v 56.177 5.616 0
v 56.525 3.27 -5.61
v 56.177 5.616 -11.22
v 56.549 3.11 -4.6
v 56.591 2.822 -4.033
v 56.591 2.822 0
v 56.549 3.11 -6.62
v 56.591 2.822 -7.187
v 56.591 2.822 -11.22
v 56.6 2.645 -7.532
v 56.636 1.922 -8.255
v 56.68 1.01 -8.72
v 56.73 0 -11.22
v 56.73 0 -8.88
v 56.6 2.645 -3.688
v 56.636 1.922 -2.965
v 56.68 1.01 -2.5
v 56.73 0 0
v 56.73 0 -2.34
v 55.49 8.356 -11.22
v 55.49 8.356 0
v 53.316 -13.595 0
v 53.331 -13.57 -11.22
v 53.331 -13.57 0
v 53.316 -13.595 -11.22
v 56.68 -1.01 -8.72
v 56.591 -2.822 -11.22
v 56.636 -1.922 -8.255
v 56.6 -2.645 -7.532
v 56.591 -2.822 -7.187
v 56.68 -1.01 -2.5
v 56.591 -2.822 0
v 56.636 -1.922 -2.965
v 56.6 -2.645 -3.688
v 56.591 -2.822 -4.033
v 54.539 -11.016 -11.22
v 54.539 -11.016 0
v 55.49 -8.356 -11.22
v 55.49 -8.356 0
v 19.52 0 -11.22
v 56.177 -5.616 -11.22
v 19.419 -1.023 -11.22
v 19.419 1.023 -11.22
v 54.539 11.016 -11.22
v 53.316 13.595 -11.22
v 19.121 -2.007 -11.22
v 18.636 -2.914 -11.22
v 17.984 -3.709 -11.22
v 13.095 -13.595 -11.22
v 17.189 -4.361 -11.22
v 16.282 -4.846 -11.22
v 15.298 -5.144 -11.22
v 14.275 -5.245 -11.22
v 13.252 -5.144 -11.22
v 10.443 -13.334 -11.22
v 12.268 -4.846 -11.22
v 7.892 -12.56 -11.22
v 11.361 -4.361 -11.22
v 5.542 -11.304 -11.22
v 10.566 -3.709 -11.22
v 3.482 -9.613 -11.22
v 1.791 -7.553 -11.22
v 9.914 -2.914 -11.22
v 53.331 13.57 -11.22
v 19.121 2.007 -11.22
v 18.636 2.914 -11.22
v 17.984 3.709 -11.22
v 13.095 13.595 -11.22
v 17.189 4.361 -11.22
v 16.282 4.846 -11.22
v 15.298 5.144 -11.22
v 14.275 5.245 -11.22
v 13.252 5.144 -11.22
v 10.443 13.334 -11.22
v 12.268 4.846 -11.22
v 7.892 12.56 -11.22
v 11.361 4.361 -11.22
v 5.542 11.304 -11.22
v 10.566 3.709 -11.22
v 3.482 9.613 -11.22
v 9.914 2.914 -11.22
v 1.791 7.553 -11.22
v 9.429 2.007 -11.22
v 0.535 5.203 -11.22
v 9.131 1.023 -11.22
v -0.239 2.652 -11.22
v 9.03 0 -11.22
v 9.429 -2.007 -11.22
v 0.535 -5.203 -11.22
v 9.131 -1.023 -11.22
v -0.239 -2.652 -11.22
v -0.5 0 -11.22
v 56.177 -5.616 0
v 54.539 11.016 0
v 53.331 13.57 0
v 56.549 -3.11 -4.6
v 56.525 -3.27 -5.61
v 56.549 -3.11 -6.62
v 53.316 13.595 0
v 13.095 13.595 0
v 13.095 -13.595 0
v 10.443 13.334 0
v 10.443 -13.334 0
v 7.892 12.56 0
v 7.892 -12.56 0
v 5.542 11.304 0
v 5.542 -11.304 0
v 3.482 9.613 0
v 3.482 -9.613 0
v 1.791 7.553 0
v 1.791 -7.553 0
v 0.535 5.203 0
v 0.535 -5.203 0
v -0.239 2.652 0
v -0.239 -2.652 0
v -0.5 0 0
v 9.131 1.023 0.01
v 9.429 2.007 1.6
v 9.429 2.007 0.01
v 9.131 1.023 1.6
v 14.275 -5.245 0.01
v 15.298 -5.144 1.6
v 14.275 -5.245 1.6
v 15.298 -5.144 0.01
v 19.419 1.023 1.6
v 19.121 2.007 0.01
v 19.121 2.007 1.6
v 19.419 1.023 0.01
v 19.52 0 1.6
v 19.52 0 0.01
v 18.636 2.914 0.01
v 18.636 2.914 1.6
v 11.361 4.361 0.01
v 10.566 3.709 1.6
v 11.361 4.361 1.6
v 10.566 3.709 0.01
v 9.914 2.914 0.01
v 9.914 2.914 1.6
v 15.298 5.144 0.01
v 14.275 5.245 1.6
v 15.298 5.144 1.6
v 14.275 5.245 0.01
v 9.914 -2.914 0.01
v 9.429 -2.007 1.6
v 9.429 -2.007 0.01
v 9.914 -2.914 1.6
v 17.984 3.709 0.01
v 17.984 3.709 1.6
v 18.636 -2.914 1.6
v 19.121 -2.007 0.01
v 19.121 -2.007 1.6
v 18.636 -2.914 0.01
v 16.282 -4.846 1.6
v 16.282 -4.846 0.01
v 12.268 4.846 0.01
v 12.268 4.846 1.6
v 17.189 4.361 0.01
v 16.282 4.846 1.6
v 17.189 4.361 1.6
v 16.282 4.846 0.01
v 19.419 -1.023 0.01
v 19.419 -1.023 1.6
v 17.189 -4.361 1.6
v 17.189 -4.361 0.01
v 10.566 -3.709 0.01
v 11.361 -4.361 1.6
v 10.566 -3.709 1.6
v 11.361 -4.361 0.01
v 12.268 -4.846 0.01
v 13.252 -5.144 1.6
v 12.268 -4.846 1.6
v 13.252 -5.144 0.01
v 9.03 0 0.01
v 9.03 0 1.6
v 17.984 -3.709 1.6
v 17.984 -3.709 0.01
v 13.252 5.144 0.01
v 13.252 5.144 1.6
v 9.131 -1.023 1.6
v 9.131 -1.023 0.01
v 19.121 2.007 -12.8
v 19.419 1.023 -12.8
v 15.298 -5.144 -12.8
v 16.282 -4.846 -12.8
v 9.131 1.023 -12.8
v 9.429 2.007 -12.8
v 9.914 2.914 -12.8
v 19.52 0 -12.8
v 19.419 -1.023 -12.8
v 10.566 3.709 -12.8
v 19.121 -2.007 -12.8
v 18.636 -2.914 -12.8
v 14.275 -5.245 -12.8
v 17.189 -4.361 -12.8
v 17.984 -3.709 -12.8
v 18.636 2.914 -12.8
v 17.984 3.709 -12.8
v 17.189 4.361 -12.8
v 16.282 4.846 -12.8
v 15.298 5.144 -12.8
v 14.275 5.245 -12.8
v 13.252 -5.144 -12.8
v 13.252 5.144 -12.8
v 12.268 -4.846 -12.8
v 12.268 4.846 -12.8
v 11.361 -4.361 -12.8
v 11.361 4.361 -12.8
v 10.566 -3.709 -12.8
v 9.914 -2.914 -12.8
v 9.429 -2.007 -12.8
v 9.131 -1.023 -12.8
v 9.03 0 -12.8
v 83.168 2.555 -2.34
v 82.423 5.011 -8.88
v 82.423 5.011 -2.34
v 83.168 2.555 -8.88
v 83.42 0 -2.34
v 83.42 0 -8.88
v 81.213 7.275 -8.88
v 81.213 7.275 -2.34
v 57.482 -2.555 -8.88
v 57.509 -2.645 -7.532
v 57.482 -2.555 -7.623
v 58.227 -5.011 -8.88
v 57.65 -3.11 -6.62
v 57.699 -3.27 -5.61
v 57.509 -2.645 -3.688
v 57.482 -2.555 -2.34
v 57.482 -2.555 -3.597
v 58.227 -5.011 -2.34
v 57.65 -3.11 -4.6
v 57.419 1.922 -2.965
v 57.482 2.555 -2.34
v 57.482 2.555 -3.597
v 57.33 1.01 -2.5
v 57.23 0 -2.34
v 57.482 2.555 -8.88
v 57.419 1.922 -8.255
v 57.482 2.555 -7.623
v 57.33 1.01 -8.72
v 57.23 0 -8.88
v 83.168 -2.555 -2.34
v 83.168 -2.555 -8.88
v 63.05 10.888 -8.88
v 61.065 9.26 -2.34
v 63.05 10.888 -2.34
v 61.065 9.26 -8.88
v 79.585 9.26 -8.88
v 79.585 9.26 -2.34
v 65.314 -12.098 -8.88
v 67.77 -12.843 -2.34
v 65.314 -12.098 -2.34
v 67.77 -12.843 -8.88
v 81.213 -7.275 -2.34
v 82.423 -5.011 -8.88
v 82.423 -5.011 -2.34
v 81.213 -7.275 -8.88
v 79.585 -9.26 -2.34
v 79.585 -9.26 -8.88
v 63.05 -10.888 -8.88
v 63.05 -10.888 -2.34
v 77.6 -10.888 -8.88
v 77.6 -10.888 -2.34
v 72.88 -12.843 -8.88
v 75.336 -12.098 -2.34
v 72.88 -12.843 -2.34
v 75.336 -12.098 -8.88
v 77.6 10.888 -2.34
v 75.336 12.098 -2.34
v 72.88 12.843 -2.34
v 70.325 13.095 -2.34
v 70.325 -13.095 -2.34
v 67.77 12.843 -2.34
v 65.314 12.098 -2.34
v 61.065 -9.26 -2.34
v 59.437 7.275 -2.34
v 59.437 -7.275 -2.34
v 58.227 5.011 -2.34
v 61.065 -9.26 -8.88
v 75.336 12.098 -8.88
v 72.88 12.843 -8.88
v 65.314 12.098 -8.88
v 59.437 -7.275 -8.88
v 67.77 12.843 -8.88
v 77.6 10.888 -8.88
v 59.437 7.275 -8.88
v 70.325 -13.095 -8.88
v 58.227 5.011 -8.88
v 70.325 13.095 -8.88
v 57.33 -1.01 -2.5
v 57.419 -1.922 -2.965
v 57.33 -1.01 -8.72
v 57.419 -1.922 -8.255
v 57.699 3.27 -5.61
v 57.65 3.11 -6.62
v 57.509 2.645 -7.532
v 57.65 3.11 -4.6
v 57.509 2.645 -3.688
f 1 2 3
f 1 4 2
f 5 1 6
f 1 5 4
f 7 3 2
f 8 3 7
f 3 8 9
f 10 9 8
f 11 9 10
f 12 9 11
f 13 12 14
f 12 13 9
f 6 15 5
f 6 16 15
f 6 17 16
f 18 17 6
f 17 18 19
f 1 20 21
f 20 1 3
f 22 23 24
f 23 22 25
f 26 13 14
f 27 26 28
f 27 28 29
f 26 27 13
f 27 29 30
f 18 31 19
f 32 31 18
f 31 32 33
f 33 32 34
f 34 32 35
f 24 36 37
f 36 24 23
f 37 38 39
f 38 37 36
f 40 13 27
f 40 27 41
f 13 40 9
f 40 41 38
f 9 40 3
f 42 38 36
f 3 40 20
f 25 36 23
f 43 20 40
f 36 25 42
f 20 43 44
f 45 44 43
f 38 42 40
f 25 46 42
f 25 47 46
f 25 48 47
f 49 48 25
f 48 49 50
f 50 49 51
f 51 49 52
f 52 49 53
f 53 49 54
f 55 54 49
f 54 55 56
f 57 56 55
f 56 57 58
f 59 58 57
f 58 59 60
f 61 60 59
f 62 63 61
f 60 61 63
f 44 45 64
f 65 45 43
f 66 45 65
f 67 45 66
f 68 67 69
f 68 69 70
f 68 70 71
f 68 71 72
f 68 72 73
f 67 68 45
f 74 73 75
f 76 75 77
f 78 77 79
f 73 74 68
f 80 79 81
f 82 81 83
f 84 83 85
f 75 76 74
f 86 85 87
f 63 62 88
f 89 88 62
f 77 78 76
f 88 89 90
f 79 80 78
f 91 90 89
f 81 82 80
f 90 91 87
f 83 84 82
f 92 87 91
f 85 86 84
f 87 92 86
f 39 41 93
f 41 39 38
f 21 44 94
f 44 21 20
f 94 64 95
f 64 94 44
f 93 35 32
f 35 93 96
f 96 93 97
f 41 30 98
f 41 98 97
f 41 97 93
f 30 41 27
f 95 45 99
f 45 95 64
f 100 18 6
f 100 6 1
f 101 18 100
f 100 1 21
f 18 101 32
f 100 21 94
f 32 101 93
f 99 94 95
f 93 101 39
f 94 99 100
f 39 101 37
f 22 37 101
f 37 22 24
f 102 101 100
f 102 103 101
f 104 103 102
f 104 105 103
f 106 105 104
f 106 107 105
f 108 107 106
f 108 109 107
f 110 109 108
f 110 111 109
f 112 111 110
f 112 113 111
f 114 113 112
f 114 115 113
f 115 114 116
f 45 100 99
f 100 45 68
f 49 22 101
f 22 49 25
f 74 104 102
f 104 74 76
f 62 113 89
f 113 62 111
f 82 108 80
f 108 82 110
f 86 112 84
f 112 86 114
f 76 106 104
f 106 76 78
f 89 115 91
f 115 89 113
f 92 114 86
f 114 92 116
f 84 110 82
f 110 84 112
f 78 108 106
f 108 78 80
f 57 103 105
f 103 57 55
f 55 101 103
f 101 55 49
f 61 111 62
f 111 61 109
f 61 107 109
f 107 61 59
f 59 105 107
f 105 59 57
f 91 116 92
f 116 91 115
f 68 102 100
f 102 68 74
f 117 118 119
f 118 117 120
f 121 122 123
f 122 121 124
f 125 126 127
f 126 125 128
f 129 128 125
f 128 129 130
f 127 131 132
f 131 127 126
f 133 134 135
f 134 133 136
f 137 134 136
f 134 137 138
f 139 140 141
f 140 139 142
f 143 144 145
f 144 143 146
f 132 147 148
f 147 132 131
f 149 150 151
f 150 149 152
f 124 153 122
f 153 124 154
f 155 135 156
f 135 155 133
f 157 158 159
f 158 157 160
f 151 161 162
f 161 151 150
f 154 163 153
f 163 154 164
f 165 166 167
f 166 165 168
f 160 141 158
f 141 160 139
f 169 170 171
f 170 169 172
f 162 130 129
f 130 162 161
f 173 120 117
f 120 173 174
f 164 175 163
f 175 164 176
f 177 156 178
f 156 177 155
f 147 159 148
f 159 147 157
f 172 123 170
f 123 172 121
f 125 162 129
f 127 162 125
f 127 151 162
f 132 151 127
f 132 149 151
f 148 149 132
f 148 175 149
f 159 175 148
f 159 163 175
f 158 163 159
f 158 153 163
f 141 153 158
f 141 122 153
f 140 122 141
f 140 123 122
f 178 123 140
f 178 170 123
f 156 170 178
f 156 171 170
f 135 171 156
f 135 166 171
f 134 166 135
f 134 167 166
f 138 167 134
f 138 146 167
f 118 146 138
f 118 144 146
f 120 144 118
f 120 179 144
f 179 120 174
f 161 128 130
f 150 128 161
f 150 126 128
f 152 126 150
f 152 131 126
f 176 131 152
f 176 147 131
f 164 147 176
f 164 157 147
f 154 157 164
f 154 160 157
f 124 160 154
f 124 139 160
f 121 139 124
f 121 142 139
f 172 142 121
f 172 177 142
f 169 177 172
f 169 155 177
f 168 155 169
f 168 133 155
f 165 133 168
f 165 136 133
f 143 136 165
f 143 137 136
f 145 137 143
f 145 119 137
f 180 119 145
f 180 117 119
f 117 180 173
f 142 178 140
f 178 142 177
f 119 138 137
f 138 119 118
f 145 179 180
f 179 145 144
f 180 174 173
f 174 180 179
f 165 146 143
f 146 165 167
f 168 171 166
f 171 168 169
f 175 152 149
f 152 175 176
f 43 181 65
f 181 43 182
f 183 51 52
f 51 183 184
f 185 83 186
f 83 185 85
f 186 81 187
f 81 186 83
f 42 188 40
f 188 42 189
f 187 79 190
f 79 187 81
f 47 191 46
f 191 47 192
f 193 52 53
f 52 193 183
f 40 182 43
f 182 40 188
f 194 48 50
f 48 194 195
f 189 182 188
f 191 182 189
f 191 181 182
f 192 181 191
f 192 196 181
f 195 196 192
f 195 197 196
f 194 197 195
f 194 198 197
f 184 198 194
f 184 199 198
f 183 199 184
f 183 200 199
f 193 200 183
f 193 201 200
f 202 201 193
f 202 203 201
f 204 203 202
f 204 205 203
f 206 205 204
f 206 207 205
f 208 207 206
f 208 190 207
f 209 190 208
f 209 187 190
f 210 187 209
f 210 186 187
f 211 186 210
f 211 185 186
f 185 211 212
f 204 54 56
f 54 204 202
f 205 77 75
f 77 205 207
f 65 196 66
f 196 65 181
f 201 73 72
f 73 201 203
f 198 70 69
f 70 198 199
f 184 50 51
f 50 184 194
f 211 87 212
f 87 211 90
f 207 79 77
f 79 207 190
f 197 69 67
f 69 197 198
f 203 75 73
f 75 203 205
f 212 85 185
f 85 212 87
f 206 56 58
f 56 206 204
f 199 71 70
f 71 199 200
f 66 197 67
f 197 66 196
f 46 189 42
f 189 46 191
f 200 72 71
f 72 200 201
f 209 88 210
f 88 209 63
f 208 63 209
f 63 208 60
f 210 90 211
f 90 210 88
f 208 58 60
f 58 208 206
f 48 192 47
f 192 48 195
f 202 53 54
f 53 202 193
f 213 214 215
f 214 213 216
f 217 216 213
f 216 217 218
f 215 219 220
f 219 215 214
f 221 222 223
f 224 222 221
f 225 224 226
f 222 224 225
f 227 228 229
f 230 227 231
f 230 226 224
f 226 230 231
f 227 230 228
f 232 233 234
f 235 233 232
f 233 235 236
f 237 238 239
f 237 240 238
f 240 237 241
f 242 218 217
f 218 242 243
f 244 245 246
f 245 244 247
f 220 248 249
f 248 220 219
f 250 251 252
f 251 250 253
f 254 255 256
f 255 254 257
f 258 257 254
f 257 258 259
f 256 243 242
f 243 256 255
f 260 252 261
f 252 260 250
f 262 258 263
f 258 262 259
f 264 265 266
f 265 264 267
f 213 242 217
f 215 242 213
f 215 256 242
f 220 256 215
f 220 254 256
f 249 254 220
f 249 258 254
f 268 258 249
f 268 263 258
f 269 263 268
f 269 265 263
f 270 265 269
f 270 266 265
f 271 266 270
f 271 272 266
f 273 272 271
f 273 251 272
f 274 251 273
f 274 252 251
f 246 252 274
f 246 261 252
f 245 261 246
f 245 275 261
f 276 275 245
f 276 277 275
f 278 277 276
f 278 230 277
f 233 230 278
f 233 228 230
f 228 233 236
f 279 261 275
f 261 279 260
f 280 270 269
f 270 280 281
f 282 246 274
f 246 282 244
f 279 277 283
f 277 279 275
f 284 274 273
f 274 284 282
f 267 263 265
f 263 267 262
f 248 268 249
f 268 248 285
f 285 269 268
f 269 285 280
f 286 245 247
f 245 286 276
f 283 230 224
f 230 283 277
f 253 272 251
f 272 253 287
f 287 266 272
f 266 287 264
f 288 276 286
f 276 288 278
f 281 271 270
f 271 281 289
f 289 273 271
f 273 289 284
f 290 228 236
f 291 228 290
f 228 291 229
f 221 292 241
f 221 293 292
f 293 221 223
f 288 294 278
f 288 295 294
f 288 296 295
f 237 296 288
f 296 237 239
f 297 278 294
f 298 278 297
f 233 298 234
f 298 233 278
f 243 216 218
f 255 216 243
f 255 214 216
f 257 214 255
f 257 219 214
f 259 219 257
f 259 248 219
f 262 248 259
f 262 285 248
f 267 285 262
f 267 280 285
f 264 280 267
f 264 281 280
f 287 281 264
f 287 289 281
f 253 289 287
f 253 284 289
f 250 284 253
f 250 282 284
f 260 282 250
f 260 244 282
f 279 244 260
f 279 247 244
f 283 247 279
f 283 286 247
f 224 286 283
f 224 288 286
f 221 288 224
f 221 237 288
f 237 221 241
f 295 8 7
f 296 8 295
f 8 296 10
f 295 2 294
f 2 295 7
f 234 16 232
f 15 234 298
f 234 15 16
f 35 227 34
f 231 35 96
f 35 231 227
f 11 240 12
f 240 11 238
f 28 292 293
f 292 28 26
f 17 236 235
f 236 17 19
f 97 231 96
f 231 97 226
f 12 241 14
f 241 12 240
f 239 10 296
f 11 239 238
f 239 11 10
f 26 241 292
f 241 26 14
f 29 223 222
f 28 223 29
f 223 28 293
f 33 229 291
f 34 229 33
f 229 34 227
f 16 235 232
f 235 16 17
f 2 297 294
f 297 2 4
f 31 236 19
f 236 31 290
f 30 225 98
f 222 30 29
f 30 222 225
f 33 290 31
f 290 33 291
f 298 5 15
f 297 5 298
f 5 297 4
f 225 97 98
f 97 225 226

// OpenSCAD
// This is a stand-in for the Blizzard Software (digipass) authenticator
// Licensed under Creative Commons: Attribution, Share-Alike
//
// For attribution you can direct people to the original file on thingiverse:
// 		http://www.thingiverse.com/thing:593551

// ================ variables

//CUSTOMIZER VARIABLES

/* [main] */

// This is used to cut holes for the LCD and button (like if you're making a "skin")
holes=0;  // [0:"false",1:"true"]

// How far the holes above extend
hole_d=20;

/* [ overall dimensions ] */

// Total height
h=26.19;

// Total width (less any keychain stuff)
w=56.23;

// Total depth
d=10.22;

// make the authenticator this much larger in all directions
// (when making a box for an authenticator, set to like 1mm or something)
oversize=1;

// How far the chord side (keyring side) extends beyond a straight rectangle
chord_w=7.7;

/* [ keychain settings] */

// Whether to cut a hole for a keyring to attach (probably always want this =true)
keyring_hole=1;  // [0:"false",1:"true"]

// Extend the keyring forward or back to make a channel for inserting it
project_keyring=10;

// How big around the keychain post is
keychain_dia=6.54;

// How far the keychain post extends beyond the authentictor body
keychain_outset=2.0;

/* [ button options ] */

// How high the button sticks up
button_d=0.59;

// How big around the button is
button_dia=9.49;

// How far the center of the button is from the button end of the device
button_inset=14.275;

// used to make cut holes for buttons on both sides in case you put it in upside down
two_buttons=1; // [0:"false",1:"true"]

/* [ LCD screen ] */

// How wide the screen is (only used if holes=true)
lcd_w=22.62;

// How high the screen is (only used if holes=true)
lcd_h=7.54;

// How far the nearest edge of the LCD is from the button end of the device (only used if holes=true)
lcd_inset=22.68;

/* [ hidden ] */

// Make a hearthstone box (only works offline with the hearthstone stl file in the same folder)
hearthstone_box=false;

// Whether to create the front or the back side of a hearthstone box
front=true;

function chord_wh_to_r(w,h)=sqrt(pow(h/2,2)+pow(w,2));

module mainbody(oversize=0){
	h_real=h+oversize;
	d_real=d+oversize;
	chord_r=chord_wh_to_r(chord_w,h)+h/2;
	union(){ // the main body
		translate([h/2,-h_real/2,-d_real]) cube([w-(h/2)-chord_w+oversize,h_real,d_real]);
		translate([h/2,0,-d_real]) cylinder(r=h_real/2,h=d+oversize,$fn=32);
		intersection(){ // the chord side
			translate([w-chord_r,0,-d_real]) cylinder(r=chord_r+(oversize/2),h=d_real,$fn=64);
			translate([h/2,-h_real/2,-d_real]) cube([w-(h/2)+oversize,h_real,d_real]);
		}
	}
}

module authenticator(oversize=0,project_keyring=0){
	mainbody(oversize);
	// the button
	translate([button_inset,0,0.01]) cylinder(r=button_dia/2+oversize/2,h=holes?hole_d:(button_d+oversize),$fn=32);
	if(two_buttons){
		translate([button_inset,0,0.01-(holes?hole_d:(button_d+oversize))-(d+oversize)]) cylinder(r=button_dia/2+oversize/2,h=holes?hole_d:(button_d+oversize),$fn=32);
	}
	if(holes){
		// the lcd
		translate([lcd_inset,-lcd_h/2,0]) cube([lcd_w,lcd_h,hole_d]);
	}
	if(keyring_hole){
		// a keyring hole
		translate([w+keychain_outset/2+h/2,0,-(d+oversize)/2 -keychain_dia/2]) cylinder(r=h/2,h=keychain_dia+project_keyring,$fn=32);
	}
	// the keychain outset
	hull(){
		translate([w,0,-(d+oversize)/2]) rotate([0,90,0]) cylinder(r=keychain_dia/2,h=keychain_outset,$fn=20);
		translate([w,0,project_keyring-(d+oversize)/2]) rotate([0,90,0]) cylinder(r=keychain_dia/2,h=keychain_outset,$fn=20);
	}
}

module box(project_keyring=0){
	difference() {
		translate([-27,85,25]) import_stl("hearthstone.STL");
		translate([0,-d/2,0]) rotate([90,0,0]) rotate([0,0,90]) authenticator(oversize,project_keyring);
	}
}

module dovetail(width=25,depth=4,angle=45,z_angle=0){
	b=depth*tan(angle);
	littlewidth=width+b*2;
	smallness=0.01;
	linear_extrude(100) rotate([0,0,z_angle]) hull() {
		// dovetail profile
		square([smallness,width]);
		translate([depth,(width-littlewidth)/2,0]) square([smallness,littlewidth]);
	}
}

module dovetailer(width=30,depth=5.101,angle=45,reverse=false,zstop=0){	
	translate([-50,0,-25]) {
		if(reverse){
			difference() {
				cube([100,100,100]);
				translate([50+width/2,-0.01,zstop]) dovetail(width,depth,angle,90);
			}
		}else{
			union() {
				cube([100,100,100]);
				translate([50-width/2,0.01,zstop]) dovetail(width,depth,angle,-90);
			}
		}
	}
}

module container(){
	if(front){
		difference(){
			box(project_keyring=0);
			dovetailer();
		}
	}else{
		intersection(){
			box(project_keyring=project_keyring);
			dovetailer();
		}
	}
}

if(hearthstone_box){
	difference() {
		container();
		translate([-50,-50,-58]) cube([100,100,50]); // flatten the bottom so it prints easier
	}
}else{
	authenticator(oversize);
}
